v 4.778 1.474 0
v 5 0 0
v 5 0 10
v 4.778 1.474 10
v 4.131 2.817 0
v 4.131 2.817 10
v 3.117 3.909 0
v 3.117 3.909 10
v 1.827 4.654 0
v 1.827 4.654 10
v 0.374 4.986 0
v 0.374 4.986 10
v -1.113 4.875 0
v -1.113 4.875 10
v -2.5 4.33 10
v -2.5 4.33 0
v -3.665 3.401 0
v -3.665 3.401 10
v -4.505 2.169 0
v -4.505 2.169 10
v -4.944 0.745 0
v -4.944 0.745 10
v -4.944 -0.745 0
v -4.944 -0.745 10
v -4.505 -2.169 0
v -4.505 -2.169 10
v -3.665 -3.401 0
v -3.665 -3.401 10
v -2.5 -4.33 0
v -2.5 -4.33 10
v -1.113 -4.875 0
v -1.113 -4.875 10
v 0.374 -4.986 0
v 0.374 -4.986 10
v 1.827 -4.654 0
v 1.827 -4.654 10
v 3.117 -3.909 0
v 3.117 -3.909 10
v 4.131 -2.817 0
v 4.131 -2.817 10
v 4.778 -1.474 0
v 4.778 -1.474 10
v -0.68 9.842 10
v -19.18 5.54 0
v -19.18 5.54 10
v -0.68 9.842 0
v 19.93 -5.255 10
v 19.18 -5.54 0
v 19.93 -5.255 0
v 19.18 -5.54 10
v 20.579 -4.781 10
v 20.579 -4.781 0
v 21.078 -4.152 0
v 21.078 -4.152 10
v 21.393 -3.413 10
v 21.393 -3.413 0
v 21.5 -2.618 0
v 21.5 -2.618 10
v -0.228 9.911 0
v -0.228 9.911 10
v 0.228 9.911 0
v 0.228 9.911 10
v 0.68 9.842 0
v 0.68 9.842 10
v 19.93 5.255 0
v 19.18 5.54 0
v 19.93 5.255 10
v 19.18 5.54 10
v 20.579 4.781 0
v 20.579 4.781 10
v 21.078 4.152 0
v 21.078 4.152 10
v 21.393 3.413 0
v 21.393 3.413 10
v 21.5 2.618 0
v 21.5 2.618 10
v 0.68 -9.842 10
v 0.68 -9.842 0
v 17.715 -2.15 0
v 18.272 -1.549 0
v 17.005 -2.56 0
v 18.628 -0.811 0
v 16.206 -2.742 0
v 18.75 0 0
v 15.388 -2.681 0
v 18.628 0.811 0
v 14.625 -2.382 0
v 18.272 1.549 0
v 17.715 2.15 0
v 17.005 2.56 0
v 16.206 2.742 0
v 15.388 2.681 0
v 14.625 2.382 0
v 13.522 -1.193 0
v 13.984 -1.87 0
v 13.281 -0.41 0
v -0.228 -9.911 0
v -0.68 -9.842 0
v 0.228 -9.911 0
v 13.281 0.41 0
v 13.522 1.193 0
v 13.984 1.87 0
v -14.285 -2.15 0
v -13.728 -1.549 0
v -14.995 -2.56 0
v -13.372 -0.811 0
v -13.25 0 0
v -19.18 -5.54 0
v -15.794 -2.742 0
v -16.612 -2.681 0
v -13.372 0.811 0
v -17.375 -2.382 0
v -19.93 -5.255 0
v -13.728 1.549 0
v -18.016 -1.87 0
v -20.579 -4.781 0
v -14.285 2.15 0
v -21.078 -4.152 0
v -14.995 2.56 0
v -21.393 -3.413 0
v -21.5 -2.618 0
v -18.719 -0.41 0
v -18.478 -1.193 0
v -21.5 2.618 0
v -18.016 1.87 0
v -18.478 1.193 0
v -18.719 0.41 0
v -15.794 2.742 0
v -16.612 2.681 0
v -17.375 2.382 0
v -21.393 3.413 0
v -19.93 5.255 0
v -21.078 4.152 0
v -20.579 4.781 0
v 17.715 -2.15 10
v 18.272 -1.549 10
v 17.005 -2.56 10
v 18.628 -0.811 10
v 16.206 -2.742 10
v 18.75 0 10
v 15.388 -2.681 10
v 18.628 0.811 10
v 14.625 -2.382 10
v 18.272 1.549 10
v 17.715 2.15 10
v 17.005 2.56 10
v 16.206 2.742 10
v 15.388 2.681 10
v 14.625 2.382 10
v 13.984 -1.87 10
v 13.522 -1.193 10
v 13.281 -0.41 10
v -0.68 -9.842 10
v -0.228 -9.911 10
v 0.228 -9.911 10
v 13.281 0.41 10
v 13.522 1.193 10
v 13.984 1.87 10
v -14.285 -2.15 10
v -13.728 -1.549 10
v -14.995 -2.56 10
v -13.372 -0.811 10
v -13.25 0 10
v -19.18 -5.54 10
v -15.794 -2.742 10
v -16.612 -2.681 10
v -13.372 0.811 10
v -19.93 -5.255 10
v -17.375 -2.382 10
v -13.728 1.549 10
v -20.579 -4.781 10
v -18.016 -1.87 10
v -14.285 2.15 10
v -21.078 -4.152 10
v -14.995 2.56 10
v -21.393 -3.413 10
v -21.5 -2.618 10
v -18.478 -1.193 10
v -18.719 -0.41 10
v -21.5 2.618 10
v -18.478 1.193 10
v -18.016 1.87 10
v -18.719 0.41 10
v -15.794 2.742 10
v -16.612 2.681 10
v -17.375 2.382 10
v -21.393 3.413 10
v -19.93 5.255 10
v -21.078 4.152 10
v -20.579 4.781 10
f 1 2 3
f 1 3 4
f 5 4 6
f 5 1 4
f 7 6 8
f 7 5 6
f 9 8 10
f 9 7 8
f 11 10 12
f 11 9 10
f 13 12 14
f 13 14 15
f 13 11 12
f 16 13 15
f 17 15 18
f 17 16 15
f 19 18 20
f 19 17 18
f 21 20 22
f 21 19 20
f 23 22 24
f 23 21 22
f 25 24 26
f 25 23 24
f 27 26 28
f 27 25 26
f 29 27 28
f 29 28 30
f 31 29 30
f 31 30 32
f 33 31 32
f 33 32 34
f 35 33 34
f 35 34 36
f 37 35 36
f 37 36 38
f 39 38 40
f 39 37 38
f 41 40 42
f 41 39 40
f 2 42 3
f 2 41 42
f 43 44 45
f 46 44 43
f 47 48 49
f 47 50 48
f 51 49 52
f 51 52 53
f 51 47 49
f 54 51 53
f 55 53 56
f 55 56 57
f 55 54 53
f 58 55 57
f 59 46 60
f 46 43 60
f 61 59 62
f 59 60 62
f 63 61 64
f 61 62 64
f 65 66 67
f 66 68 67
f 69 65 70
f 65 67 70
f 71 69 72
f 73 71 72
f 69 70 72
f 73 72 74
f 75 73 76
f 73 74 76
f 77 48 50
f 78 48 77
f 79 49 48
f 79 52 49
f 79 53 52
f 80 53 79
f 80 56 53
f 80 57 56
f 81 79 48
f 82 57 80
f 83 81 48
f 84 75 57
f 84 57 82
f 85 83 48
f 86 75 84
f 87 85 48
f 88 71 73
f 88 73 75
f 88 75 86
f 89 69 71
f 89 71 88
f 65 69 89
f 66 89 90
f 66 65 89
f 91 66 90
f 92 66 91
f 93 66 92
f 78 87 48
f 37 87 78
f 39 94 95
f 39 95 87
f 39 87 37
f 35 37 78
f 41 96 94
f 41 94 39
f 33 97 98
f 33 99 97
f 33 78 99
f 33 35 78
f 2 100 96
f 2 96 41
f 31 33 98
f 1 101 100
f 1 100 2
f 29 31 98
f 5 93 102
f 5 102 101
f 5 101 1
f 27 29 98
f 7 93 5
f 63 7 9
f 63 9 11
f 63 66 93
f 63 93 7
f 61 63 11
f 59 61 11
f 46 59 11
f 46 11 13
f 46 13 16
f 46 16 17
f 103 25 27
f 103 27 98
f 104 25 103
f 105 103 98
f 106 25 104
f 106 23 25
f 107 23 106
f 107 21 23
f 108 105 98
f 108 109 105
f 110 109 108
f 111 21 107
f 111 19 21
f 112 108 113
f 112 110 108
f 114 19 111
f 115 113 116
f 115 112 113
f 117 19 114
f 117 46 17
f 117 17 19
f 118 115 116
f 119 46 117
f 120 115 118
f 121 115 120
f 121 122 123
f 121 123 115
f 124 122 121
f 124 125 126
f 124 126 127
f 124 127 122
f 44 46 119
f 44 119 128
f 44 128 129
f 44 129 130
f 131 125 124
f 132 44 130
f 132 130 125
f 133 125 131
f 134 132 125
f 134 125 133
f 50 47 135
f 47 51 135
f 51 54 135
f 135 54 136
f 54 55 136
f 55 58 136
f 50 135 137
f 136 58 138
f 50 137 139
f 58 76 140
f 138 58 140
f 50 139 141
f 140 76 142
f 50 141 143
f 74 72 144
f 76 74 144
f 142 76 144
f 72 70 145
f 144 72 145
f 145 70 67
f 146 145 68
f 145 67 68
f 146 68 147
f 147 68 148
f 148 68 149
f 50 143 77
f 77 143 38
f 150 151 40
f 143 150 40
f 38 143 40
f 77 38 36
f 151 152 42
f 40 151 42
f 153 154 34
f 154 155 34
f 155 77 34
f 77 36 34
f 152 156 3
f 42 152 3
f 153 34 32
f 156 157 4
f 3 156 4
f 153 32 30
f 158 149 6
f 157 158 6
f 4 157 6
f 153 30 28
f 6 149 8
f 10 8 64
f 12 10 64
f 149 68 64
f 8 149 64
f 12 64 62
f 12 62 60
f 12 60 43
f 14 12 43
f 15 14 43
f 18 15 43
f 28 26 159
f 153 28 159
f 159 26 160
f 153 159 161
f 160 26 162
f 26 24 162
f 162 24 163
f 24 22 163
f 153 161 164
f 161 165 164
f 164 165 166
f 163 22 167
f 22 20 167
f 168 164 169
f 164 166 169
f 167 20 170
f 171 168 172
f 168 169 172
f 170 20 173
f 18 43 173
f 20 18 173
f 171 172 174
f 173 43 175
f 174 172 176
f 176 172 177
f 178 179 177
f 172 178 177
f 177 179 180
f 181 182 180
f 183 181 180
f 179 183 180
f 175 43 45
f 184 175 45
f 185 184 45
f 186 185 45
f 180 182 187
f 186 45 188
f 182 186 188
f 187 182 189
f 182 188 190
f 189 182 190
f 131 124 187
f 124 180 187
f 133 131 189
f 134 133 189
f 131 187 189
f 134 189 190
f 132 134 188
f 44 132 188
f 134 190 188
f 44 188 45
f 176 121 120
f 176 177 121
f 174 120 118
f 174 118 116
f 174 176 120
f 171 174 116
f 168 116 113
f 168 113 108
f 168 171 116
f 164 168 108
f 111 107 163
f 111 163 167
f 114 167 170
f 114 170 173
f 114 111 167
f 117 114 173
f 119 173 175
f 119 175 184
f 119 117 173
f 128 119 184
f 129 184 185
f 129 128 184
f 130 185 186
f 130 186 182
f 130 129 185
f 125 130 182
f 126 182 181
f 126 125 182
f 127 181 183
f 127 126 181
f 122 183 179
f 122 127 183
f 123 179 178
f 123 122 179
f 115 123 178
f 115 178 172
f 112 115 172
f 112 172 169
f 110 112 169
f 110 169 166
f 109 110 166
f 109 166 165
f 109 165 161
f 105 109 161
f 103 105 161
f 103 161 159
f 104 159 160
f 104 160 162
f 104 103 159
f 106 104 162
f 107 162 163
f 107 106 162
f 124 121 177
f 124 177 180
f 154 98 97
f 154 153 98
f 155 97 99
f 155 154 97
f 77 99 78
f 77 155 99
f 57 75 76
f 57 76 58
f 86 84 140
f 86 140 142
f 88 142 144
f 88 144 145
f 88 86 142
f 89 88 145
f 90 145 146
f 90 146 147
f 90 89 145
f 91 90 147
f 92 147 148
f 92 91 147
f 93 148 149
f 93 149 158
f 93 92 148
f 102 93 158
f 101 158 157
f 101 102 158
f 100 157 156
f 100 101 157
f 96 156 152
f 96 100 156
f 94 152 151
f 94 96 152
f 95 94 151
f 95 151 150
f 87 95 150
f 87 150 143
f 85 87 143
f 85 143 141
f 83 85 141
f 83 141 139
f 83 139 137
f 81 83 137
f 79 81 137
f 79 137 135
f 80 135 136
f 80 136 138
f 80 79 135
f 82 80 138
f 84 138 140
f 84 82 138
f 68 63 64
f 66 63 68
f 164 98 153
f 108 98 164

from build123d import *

# Parameters (mm, degrees)
SKETCH1_R           = 5
SKETCH1_R_2         = 2.75
BOSS_EXTRUDE1_DEPTH = 10
FILLET1_R           = 3


with BuildPart() as part:
    # Sketch1 → Boss-Extrude1 (new body)
    with BuildSketch(Plane.XY):
        Polygon((-21.5, -5), (-21.5, 5), (0, 10), (21.5, 5), (21.5, -5), (0, -10), align=None)
        Circle(SKETCH1_R, mode=Mode.SUBTRACT)
        with Locations((-16, 0)):
            Circle(SKETCH1_R_2, mode=Mode.SUBTRACT)
        with Locations((16, 0)):
            Circle(SKETCH1_R_2, mode=Mode.SUBTRACT)
    extrude(amount=BOSS_EXTRUDE1_DEPTH)

    # Fillet1
    fillet1_edges = [part.edges().sort_by_distance(p)[0] for p in [
        (21.5, 5, 5),
        (21.5, -5, 5),
        (0, -10, 5),
        (-21.5, -5, 5),
        (-21.5, 5, 5),
        (0, 10, 5),
    ]]
    fillet(fillet1_edges, radius=FILLET1_R)


solid = part.part
